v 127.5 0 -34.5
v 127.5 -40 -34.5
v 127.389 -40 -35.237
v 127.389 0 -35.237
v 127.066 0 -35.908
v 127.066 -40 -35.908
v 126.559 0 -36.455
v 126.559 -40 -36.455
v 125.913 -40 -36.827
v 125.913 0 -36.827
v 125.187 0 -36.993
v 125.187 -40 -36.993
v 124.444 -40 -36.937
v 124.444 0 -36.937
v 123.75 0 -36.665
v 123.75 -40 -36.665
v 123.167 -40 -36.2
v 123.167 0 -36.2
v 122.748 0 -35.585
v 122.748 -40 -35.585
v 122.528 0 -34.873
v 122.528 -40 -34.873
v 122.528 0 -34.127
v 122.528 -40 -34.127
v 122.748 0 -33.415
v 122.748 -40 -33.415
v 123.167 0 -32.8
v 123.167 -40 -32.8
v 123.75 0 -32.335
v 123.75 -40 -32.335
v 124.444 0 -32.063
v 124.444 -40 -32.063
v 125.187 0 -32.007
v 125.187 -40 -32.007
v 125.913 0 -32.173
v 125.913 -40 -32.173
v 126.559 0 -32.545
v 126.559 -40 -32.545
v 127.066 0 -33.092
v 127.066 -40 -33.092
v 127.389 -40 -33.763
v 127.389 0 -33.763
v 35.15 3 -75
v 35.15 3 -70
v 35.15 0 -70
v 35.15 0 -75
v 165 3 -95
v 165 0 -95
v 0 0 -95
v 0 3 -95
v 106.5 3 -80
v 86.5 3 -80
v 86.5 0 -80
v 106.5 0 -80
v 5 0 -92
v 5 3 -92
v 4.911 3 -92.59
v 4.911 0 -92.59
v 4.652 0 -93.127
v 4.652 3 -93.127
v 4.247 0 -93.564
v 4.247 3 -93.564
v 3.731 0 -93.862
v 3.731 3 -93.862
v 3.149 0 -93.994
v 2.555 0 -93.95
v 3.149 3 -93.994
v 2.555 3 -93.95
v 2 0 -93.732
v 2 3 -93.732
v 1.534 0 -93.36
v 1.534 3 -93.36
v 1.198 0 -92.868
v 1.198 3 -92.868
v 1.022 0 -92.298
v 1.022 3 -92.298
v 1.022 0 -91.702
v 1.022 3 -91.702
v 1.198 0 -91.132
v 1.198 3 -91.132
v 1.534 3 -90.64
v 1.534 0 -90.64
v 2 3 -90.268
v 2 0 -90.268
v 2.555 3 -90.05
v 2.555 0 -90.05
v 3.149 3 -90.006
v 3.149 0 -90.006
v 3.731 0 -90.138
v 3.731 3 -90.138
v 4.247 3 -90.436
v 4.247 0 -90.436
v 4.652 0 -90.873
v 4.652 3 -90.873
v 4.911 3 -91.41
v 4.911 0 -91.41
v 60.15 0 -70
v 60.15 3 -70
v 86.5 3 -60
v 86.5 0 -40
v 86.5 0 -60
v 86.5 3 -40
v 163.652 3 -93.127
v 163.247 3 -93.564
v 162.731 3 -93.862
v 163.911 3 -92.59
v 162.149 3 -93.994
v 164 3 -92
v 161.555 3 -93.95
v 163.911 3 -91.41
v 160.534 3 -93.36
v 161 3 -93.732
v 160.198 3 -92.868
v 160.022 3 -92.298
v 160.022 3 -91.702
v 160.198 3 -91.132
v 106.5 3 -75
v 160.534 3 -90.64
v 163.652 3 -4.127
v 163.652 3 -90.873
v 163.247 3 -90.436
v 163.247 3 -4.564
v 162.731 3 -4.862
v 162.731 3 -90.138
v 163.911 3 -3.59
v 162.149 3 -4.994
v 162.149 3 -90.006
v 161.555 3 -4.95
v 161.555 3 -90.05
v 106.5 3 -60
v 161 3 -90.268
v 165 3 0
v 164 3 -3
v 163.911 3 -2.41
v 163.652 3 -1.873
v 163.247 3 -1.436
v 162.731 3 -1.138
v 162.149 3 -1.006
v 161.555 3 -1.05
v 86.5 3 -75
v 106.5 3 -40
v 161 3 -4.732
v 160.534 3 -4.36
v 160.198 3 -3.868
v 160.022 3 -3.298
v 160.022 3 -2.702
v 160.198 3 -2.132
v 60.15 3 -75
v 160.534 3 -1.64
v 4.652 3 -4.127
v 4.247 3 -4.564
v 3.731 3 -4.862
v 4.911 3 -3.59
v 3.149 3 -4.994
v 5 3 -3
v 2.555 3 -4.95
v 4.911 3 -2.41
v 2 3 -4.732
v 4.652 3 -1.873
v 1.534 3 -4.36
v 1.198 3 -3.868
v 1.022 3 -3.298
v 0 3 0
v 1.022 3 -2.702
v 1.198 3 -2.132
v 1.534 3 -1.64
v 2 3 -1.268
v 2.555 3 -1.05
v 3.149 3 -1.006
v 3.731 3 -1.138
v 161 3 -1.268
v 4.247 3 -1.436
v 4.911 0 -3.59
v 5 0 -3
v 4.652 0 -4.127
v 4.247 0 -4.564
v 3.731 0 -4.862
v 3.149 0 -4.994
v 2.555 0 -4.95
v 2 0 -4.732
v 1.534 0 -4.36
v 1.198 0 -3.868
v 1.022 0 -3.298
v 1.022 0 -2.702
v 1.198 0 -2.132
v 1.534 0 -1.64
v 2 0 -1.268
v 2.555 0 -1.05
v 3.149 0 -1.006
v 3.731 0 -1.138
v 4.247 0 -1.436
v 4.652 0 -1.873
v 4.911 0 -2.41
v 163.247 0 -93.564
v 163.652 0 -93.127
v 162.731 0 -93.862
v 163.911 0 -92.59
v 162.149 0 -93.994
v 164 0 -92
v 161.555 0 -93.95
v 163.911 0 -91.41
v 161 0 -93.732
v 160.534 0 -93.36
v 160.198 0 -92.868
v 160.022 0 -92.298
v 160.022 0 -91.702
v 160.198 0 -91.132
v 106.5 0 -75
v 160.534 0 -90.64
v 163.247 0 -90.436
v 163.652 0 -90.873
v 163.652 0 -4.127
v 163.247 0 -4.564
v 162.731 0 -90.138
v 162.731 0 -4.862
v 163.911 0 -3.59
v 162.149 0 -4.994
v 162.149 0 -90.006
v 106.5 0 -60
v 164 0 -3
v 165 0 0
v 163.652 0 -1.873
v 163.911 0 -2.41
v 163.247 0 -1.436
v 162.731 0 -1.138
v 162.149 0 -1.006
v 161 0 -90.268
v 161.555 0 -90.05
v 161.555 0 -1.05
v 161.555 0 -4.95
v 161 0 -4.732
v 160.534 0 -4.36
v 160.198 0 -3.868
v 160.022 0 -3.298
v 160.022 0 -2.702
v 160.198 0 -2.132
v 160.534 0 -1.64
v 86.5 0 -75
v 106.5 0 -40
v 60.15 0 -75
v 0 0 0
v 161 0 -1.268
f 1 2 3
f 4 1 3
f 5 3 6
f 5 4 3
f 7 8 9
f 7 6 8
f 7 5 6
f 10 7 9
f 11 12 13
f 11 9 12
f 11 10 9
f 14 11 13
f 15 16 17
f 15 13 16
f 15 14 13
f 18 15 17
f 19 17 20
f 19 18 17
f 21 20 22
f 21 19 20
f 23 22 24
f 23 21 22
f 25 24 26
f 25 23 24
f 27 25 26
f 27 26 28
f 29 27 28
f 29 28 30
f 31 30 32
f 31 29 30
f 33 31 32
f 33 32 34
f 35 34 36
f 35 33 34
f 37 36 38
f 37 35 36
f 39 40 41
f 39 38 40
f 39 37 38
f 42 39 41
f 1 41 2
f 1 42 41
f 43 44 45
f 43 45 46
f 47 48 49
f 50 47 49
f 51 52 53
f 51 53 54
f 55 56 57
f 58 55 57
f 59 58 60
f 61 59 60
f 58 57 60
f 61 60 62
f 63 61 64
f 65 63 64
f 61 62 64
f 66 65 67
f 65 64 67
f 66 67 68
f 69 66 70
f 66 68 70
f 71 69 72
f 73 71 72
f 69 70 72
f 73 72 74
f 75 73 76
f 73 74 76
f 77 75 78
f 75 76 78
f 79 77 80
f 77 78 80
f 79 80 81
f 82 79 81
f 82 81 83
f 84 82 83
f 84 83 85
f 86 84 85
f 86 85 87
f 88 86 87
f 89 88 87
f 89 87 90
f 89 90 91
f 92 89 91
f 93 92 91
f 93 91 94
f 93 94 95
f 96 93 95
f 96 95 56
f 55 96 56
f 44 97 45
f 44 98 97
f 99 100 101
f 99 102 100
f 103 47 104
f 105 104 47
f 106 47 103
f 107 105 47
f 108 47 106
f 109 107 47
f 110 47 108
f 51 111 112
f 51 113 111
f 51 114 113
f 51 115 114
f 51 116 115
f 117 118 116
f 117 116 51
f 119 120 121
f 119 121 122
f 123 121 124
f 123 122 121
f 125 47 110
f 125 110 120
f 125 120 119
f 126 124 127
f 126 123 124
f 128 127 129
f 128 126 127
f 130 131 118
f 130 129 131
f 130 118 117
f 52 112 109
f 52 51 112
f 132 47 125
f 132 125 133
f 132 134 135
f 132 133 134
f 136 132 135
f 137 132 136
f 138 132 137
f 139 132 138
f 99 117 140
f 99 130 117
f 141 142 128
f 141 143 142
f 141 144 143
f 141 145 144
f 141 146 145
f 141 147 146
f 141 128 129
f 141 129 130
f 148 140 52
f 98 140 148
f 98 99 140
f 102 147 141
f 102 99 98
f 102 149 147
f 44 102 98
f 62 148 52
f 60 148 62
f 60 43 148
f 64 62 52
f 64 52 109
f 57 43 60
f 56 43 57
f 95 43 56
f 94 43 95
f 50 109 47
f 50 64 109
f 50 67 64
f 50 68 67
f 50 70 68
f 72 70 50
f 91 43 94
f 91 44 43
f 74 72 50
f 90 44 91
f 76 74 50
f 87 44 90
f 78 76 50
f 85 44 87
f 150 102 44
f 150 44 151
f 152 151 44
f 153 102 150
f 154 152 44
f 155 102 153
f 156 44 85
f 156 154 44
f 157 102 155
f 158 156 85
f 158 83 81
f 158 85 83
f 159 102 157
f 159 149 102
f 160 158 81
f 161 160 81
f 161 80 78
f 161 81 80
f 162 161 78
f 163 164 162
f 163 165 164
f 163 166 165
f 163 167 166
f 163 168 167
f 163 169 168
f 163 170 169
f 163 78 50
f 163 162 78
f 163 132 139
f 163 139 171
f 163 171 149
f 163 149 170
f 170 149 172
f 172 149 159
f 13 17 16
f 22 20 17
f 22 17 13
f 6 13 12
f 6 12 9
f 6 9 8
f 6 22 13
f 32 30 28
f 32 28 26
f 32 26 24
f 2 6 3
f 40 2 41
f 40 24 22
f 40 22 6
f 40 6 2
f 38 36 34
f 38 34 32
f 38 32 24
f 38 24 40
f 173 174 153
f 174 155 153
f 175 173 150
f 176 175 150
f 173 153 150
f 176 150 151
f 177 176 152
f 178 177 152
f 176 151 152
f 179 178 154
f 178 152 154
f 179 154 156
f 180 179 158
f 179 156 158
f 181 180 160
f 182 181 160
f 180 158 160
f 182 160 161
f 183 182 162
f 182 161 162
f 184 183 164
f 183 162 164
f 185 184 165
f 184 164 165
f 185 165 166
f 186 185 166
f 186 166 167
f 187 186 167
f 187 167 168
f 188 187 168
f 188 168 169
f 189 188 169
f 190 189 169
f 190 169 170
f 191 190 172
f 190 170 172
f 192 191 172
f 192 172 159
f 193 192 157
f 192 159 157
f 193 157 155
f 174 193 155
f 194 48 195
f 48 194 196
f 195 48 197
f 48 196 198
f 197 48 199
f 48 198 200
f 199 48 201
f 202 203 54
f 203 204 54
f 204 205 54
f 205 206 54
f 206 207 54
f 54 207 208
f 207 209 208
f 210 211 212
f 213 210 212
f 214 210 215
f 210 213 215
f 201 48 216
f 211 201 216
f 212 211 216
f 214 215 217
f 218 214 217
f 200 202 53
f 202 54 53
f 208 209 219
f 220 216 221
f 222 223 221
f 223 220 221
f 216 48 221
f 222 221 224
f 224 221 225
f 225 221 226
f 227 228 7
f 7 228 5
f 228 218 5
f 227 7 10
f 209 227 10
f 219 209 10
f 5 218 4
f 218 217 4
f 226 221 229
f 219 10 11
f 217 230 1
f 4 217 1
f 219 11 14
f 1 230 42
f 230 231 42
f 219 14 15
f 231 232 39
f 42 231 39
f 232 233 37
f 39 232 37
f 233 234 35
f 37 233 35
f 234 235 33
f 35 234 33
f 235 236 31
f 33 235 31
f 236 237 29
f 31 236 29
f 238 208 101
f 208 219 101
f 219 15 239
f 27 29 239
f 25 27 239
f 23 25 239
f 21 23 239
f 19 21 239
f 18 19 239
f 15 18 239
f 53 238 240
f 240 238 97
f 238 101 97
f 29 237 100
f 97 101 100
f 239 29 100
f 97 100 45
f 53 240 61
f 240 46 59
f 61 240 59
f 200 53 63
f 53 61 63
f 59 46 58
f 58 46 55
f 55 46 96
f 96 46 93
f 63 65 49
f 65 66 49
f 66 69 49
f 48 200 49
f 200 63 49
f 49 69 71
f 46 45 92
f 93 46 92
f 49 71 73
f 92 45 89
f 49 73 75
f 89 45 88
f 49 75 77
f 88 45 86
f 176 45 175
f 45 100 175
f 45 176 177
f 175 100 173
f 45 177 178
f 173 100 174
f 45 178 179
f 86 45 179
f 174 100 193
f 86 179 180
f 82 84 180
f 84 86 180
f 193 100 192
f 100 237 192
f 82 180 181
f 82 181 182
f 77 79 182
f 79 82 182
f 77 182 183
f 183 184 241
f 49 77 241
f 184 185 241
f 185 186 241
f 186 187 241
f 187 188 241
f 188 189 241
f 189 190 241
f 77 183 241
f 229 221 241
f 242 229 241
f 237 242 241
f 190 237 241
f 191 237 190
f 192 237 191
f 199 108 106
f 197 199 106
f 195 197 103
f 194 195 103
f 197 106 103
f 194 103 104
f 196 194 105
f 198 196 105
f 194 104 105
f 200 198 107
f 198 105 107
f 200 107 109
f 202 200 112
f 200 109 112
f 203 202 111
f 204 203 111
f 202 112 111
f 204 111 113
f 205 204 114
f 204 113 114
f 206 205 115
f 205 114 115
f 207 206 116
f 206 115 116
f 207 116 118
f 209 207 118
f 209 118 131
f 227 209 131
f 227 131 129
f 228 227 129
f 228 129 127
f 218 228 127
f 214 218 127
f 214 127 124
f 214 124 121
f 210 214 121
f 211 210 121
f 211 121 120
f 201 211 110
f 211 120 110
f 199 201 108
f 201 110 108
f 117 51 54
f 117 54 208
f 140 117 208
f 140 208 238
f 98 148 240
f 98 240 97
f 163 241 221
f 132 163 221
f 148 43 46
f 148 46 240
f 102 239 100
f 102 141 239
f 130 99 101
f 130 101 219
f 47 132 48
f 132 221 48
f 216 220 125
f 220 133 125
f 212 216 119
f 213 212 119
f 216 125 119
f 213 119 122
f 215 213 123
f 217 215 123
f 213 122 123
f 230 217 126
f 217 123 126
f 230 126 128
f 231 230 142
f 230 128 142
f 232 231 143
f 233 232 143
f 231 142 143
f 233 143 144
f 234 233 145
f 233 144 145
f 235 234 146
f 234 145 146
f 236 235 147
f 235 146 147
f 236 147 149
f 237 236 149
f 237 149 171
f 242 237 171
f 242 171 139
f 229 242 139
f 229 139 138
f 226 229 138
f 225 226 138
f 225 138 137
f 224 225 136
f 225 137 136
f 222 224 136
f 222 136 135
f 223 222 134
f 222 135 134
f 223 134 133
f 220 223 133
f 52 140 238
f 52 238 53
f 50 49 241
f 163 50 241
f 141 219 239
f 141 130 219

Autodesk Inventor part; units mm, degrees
ref_plane "YZ Plane" through (0, 0, 0) normal (1, 0, 0) x (0, 1, 0)
ref_plane "XZ Plane" through (0, 0, 0) normal (0, 1, 0) x (-1, 0, 0)
ref_plane "XY Plane" through (0, 0, 0) normal (0, 0, 1) x (1, 0, 0)
sketch "草圖1" plane through (0, 0, 0) normal (0, 1, 0) x (-1, 0, 0)
  line L0 (0, 0) -> (-165, 0)
  line L1 (-165, 0) -> (-165, -95)
  line L2 (-165, -95) -> (0, -95)
  line L3 (0, -95) -> (0, 0)
  dimension "d0" = 165
  dimension "d1" = 95
extrude "擠出1" add sketch "草圖1" along normal blind 3
sketch "草圖2" plane through (0, 3, 0) normal (0, 1, 0) x (1, 0, 0)
  line L0 (30, 75) -> (65, 75)
  line L1 (65, 75) -> (65, 20)
  line L2 (65, 20) -> (30, 20)
  line L3 (30, 20) -> (30, 75)
  line L4 (0, 95) -> (0, 0) projected
  line L5 (165, 95) -> (0, 95) projected
  line L6 (35.1505, 75) -> (60.1505, 75)
  line L7 (60.1505, 75) -> (60.1505, 70)
  line L8 (60.1505, 70) -> (35.1505, 70)
  line L9 (35.1505, 70) -> (35.1505, 75)
  dimension "d4" = 55
  dimension "d5" = 35
  dimension "d6" = 30
  dimension "d7" = 20
  dimension "d8" = 25
  dimension "d9" = 5
  dimension "d10" = 0
extrude "擠出2" cut sketch "草圖2" against normal blind 3 contours L0 L7 L8 L9
sketch "草圖3" plane through (0, 3, 0) normal (0, 1, 0) x (1, 0, 0)
  line L0 (86.5, 60) -> (106.5, 60)
  line L1 (106.5, 60) -> (106.5, 40)
  line L2 (106.5, 40) -> (86.5, 40)
  line L3 (86.5, 40) -> (86.5, 60)
  line L4 (85, 55) -> (108, 55)
  line L5 (108, 55) -> (108, 10)
  line L6 (108, 10) -> (85, 10)
  line L7 (85, 10) -> (85, 55)
  line L8 (165, 0) -> (165, 95) projected
  line L9 (0, 0) -> (165, 0) projected
  dimension "d13" = 20
  dimension "d14" = 20
  dimension "d15" = 23
  dimension "d16" = 45
  dimension "d17" = 80
  dimension "d18" = 1.5
  dimension "d19" = 30
  dimension "d20" = 10
extrude "擠出3" cut sketch "草圖3" against normal blind 3 contours L0 L1 L4 L3 | L4 L1 L2 L3
sketch "草圖4" plane through (0, 3, 0) normal (0, 1, 0) x (1, 0, 0)
  line L0 (86.5, 80) -> (106.5, 80)
  line L1 (106.5, 80) -> (106.5, 75)
  line L2 (106.5, 75) -> (86.5, 75)
  line L3 (86.5, 75) -> (86.5, 80)
  line L4 (86.5, 40) -> (86.5, 60) projected
  line L5 (106.5, 60) -> (106.5, 40) projected
  line L6 (86.5, 60) -> (106.5, 60) projected
  point P0 (0, 0)
  dimension "d23" = 0
  dimension "d24" = 0
  dimension "d25" = 5
  dimension "d26" = 15
extrude "擠出4" cut sketch "草圖4" against normal blind 3
sketch "草圖5" plane through (0, 3, 0) normal (0, 1, 0) x (1, 0, 0)
  circle A0 centre (3, 3) radius 2
  line L0 (0, 95) -> (0, 0) projected
  line L1 (0, 0) -> (165, 0) projected
  circle A1 centre (3, 92) radius 2
  line L2 (165, 95) -> (0, 95) projected
  circle A2 centre (162, 92) radius 2
  line L3 (165, 0) -> (165, 95) projected
  circle A3 centre (162, 3) radius 2
  dimension "d29" = 4
  dimension "d30" = 3
  dimension "d31" = 3
  dimension "d32" = 4
  dimension "d33" = 3
  dimension "d34" = 3
  dimension "d35" = 4
  dimension "d36" = 3
  dimension "d37" = 3
  dimension "d38" = 4
  dimension "d39" = 3
  dimension "d40" = 3
extrude "擠出5" cut sketch "草圖5" against normal blind 5 contours A0 | A1 | A2 | A3
sketch "草圖6" plane through (0, 0, 0) normal (0, -1, 0) x (1, 0, 0)
  circle A0 centre (125, -34.5) radius 2.5
  line L0 (165, 0) -> (165, -95) projected
  line L1 (0, 0) -> (165, 0) projected
  dimension "d43" = 5
  dimension "d44" = 40
  dimension "d45" = 32
extrude "擠出6" add sketch "草圖6" along normal blind 40
